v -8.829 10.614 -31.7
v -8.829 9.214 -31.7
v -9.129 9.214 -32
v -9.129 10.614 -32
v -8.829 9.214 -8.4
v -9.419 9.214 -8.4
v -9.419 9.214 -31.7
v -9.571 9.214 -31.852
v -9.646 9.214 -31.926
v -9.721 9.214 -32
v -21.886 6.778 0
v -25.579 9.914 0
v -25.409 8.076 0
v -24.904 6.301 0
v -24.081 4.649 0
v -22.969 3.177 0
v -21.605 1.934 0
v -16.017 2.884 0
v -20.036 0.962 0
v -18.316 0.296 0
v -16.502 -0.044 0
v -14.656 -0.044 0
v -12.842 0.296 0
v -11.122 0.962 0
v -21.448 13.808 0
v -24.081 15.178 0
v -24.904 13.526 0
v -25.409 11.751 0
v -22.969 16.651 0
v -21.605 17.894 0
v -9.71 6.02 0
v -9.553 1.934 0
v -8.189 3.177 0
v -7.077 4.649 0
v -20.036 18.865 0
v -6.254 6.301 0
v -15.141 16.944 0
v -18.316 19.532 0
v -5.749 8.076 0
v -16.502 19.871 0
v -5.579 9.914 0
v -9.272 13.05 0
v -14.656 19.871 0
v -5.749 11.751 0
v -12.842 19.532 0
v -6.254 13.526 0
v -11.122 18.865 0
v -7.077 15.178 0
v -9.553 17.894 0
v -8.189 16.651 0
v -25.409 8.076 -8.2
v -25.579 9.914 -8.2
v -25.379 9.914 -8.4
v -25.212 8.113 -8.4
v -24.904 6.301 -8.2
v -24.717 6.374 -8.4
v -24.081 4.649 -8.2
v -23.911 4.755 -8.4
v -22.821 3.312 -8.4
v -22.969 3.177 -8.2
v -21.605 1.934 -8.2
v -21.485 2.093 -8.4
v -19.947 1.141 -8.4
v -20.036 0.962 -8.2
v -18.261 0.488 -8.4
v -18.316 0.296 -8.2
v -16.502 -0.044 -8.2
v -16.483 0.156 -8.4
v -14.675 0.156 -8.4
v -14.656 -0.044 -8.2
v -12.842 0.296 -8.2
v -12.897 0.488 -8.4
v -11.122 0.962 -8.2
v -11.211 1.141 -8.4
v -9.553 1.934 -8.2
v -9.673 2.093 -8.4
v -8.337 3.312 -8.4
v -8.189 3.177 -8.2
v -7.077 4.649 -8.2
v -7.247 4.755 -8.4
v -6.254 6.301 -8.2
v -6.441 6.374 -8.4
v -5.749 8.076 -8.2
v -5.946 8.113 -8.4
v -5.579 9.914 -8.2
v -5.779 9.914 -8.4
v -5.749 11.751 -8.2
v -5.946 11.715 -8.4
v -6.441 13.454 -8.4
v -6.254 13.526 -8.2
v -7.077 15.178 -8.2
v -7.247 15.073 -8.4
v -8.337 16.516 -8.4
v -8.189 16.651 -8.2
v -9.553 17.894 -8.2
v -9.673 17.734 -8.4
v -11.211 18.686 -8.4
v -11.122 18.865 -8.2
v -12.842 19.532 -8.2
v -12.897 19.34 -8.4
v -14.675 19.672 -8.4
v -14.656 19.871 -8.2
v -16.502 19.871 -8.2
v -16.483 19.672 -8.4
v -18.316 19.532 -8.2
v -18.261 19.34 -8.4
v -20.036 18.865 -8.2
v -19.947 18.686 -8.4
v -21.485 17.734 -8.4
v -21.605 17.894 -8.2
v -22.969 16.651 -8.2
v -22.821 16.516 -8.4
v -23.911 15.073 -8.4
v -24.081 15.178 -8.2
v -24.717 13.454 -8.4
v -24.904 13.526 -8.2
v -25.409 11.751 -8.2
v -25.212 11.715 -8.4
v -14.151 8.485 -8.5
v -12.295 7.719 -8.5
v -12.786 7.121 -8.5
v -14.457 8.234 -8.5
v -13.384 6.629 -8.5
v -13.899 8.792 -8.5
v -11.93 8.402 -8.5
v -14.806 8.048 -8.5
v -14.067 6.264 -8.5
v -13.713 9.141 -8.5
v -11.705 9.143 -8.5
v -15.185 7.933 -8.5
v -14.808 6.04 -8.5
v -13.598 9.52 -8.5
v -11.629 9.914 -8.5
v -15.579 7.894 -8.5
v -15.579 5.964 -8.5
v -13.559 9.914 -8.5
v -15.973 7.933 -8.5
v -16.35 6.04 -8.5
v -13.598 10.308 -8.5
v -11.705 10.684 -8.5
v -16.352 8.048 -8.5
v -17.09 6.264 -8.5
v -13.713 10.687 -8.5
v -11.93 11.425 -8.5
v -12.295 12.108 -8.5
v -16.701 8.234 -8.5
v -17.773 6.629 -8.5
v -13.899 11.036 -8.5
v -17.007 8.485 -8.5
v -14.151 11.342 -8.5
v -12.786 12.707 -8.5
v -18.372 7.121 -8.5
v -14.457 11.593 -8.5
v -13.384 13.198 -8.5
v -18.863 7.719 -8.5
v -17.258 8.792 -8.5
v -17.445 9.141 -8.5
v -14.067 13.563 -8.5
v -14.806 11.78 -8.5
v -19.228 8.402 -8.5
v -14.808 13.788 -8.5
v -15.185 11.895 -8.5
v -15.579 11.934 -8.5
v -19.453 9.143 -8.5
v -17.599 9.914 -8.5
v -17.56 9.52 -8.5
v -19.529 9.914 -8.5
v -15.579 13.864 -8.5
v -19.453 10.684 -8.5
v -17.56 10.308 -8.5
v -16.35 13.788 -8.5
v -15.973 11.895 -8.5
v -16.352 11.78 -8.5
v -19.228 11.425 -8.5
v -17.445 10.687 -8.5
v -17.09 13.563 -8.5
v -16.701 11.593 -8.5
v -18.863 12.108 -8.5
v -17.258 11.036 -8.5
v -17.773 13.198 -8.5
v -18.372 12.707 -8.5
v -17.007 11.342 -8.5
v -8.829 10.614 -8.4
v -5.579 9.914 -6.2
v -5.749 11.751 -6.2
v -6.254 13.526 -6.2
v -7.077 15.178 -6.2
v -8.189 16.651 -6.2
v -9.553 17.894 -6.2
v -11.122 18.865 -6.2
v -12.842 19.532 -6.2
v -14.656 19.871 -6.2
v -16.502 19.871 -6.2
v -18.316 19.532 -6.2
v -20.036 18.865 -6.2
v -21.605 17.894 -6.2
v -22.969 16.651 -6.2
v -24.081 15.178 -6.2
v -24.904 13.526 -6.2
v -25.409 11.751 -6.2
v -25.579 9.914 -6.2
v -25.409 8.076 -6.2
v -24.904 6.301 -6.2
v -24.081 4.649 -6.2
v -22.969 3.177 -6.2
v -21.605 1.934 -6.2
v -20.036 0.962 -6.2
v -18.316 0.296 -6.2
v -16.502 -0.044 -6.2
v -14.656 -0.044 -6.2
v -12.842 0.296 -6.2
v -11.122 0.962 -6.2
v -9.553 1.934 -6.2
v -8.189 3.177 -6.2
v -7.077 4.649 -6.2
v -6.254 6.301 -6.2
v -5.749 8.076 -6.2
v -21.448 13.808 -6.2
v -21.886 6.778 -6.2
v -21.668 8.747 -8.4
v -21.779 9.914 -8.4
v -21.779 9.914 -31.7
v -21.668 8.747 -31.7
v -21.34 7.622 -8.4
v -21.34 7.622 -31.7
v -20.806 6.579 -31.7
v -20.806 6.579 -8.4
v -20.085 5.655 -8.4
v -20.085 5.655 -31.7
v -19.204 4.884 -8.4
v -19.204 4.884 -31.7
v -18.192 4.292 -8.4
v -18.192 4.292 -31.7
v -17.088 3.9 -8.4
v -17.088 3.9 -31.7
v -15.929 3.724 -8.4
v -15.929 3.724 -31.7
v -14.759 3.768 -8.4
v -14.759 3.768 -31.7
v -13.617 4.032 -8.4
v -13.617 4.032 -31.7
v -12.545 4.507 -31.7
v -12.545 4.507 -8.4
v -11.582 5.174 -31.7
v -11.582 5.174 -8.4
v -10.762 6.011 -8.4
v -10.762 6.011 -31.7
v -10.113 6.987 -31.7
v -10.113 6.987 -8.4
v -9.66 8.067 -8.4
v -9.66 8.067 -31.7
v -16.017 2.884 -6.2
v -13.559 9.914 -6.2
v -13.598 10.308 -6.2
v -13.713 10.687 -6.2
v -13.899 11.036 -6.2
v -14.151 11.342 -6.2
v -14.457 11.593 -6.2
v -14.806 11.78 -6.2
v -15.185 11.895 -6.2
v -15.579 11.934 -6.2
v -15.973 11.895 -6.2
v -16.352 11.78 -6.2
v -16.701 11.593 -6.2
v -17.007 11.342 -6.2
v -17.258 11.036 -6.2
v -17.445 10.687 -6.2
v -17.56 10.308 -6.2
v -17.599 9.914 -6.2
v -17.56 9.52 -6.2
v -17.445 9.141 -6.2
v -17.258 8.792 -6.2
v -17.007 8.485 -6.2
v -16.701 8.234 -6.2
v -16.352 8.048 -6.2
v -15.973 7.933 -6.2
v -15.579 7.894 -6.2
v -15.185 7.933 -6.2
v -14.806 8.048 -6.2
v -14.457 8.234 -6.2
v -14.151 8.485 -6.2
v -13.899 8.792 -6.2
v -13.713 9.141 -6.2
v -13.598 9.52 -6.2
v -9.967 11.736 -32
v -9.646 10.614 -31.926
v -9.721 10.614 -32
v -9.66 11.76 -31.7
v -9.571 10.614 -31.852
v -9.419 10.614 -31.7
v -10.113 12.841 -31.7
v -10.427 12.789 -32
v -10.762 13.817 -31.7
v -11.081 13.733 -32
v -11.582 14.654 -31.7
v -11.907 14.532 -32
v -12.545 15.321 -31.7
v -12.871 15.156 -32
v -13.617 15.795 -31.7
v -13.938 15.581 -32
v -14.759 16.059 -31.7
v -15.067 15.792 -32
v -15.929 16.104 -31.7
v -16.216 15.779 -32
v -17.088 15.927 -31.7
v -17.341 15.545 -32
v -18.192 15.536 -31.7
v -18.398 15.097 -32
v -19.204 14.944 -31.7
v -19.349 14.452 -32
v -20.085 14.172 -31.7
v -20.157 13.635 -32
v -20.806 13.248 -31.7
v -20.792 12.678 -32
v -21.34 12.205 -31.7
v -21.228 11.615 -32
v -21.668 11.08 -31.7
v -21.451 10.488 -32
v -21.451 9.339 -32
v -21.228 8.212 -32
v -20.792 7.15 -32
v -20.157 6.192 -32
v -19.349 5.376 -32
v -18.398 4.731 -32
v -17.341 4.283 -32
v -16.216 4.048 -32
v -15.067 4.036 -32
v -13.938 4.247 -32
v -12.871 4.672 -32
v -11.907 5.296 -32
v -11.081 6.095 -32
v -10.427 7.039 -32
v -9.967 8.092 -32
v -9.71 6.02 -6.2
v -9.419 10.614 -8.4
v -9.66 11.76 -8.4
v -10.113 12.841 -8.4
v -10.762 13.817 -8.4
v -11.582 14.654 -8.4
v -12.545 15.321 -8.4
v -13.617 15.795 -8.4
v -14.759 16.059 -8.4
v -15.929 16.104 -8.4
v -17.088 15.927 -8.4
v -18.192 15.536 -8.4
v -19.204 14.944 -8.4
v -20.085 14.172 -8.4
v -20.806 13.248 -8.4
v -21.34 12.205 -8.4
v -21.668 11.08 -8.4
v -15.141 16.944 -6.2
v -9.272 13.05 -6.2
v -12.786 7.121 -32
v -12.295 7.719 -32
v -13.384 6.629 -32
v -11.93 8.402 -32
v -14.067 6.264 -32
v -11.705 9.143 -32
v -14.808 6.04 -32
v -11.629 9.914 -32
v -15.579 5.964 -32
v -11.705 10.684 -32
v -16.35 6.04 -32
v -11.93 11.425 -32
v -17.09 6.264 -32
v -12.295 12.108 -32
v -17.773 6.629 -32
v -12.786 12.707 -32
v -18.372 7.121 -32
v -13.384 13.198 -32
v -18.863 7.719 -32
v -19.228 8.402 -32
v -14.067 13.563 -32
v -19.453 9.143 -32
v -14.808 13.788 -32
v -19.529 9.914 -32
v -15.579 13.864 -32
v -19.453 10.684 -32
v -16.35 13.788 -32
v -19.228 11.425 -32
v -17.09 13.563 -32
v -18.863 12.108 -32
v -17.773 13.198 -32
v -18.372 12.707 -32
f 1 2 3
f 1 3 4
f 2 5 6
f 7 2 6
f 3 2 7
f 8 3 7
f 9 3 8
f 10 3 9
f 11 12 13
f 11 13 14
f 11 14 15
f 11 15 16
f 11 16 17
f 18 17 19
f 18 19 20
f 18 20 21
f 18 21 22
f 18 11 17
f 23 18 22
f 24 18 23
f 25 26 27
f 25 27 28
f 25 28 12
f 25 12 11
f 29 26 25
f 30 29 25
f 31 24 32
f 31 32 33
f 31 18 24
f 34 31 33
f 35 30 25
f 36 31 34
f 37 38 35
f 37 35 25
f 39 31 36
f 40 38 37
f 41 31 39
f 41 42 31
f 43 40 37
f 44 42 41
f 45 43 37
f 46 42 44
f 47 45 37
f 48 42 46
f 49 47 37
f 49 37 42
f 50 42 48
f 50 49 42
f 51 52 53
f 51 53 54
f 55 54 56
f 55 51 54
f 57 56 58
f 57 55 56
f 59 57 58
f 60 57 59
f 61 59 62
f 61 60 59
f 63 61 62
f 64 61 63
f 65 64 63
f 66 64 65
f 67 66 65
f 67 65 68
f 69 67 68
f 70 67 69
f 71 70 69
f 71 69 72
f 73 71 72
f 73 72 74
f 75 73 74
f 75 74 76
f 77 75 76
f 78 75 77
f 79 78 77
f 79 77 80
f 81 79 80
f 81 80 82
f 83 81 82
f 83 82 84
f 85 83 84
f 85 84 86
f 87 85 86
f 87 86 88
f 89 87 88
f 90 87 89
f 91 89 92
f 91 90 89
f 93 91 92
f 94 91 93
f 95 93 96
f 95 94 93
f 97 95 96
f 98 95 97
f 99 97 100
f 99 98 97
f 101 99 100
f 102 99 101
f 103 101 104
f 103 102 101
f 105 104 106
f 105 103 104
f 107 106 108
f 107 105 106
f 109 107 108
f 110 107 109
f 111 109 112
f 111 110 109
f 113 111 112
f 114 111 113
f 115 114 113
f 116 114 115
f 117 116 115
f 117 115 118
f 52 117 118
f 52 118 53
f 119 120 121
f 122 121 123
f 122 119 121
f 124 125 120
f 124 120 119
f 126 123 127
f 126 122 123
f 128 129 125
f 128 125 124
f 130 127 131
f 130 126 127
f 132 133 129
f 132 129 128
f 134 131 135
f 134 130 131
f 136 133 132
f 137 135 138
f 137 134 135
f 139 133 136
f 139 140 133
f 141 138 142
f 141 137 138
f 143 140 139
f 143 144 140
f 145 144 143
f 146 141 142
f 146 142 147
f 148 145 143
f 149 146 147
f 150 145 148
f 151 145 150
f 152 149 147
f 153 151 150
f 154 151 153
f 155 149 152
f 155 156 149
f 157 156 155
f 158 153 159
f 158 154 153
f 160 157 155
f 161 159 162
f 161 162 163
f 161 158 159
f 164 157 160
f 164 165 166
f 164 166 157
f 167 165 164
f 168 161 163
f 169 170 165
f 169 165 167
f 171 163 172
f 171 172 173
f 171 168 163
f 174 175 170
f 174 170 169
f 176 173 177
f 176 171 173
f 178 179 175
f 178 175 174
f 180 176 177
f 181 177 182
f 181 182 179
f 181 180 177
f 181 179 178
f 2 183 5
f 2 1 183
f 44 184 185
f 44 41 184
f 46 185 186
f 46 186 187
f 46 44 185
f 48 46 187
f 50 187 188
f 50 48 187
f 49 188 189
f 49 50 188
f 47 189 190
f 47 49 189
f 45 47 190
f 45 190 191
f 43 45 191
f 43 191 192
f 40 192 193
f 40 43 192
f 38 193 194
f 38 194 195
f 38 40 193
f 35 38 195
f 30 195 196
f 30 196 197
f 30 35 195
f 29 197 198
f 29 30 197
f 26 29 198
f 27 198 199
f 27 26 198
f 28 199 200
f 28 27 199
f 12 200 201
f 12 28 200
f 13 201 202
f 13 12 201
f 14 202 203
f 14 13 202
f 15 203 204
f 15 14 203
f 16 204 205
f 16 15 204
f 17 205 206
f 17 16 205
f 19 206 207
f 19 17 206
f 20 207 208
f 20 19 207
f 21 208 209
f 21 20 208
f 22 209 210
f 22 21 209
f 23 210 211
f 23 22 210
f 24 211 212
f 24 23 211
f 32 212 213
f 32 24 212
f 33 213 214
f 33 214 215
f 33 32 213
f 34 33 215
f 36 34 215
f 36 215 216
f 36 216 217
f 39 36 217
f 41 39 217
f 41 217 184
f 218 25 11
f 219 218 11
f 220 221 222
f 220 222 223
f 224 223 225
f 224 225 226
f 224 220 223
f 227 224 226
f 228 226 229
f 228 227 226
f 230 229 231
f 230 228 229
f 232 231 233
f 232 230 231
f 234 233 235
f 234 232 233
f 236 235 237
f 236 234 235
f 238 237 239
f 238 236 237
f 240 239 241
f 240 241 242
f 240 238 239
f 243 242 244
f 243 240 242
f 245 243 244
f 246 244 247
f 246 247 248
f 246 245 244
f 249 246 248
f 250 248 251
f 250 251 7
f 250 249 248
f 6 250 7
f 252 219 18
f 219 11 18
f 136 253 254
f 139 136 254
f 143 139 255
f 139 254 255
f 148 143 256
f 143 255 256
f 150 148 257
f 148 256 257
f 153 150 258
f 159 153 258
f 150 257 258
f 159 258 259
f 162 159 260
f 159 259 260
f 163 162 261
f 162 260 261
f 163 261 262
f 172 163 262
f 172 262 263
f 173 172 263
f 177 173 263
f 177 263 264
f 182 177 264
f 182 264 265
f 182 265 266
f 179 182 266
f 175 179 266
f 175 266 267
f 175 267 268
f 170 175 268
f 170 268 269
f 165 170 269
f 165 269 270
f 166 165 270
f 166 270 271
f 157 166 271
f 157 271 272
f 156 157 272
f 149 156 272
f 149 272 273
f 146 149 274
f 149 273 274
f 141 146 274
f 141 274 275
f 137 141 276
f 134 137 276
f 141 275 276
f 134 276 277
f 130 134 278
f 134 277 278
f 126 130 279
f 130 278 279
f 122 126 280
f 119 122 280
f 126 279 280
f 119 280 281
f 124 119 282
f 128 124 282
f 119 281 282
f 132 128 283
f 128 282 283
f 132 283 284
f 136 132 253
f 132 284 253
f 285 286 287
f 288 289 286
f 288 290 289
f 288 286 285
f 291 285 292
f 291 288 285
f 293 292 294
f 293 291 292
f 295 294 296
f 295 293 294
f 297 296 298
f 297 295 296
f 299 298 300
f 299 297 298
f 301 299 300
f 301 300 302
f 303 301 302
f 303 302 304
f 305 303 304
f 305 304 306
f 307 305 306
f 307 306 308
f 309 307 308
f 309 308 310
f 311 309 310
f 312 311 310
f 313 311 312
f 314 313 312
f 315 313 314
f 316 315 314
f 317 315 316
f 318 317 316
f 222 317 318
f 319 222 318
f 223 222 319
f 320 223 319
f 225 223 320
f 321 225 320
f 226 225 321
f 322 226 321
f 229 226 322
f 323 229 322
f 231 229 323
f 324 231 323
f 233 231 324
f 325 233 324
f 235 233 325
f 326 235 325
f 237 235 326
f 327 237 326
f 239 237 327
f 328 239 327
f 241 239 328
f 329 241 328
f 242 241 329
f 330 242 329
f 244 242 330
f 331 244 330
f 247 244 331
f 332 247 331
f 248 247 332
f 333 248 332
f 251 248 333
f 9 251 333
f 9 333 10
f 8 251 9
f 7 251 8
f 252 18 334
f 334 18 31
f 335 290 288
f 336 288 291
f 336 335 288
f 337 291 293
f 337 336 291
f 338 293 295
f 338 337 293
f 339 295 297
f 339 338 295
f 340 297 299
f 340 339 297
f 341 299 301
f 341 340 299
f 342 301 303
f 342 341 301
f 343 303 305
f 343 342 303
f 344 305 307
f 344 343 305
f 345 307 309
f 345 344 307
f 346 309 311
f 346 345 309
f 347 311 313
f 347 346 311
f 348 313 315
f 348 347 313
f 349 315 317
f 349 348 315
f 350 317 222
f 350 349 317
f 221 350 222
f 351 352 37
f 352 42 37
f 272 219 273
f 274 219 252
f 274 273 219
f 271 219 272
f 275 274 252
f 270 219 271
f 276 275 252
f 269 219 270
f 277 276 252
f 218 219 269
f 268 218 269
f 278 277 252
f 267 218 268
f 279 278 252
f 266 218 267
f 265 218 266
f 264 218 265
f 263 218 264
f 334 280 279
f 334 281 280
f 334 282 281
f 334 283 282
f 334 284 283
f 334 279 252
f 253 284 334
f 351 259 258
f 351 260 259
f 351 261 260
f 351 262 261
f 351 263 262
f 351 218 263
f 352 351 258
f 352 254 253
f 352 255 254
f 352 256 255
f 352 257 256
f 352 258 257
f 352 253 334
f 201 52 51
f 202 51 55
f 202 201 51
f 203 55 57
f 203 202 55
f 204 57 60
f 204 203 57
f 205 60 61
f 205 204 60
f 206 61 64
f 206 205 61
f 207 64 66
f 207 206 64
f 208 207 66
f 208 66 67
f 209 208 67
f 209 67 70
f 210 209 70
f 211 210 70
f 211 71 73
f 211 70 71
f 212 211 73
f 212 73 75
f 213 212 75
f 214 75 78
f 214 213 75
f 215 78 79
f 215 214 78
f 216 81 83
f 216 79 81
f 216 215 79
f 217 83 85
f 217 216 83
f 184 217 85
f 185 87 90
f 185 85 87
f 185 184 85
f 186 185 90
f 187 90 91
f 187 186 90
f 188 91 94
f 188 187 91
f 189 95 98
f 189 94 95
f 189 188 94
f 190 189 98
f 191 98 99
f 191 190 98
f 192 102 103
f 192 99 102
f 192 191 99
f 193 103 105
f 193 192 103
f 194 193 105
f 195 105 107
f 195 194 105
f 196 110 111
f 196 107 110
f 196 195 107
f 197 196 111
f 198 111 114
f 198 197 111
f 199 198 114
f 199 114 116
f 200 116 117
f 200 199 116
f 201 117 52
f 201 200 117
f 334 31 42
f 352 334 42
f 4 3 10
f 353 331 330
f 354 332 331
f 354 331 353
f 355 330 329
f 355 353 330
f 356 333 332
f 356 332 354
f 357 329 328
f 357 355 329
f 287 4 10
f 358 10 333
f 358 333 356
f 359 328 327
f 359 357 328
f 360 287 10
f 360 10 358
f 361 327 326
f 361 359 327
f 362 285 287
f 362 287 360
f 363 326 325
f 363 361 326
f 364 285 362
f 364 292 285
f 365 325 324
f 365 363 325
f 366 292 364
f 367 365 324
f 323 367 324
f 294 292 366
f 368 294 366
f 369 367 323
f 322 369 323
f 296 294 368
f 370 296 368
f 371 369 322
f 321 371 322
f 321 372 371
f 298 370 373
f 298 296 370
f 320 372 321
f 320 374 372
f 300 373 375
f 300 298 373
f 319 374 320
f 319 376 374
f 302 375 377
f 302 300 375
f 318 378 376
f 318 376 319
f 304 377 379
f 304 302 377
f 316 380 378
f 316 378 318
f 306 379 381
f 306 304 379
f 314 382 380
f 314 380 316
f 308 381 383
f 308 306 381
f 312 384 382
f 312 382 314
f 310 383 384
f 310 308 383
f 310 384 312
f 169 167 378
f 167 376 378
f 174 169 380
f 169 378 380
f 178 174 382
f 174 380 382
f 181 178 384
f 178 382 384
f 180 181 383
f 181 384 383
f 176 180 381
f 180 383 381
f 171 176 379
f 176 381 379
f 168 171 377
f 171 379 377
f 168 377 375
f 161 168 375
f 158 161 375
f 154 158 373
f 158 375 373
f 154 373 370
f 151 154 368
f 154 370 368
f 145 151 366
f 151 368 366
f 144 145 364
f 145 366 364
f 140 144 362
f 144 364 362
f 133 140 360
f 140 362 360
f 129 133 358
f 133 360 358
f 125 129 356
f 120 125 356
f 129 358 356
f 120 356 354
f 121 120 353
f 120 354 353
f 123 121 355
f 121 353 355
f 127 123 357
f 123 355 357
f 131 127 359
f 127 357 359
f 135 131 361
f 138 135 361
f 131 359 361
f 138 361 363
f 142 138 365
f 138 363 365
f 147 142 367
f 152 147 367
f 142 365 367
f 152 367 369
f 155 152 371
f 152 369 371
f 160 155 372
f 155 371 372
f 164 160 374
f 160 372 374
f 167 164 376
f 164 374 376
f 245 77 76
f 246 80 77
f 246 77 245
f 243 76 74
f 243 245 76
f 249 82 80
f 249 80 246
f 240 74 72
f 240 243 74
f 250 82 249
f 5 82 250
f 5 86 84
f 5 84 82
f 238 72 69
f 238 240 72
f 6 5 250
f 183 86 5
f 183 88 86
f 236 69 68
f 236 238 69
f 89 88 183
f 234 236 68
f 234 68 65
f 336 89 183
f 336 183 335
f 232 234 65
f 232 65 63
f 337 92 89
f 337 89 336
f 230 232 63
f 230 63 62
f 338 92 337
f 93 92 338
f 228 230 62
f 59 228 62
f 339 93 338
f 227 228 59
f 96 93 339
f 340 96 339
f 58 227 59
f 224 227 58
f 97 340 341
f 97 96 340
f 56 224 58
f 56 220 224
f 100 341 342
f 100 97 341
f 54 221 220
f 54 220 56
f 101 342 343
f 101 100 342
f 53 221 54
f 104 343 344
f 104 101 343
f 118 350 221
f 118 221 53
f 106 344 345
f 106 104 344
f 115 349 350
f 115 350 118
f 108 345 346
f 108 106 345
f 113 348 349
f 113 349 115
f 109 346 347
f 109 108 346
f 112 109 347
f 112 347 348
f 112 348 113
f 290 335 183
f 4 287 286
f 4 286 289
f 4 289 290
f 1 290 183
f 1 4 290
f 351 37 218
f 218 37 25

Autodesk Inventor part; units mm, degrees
ref_plane "YZ Plane" through (0, 0, 0) normal (1, 0, 0) x (0, 1, 0)
ref_plane "XZ Plane" through (0, 0, 0) normal (0, 1, 0) x (-1, 0, 0)
ref_plane "Work Plane1" through (0, 0, 0) normal (0, 0, 1) x (1, 0, 0)
sketch "Sketch1" plane through (0, 0, 0) normal (0, 0, 1) x (1, 0, 0)
  line L0 (-9.8058, 6.0834) -> (-16.0096, 2.999) projected
  line L1 (-16.0096, 2.999) -> (-21.7826, 6.8295) projected
  line L2 (-21.7826, 6.8295) -> (-21.3519, 13.7443) projected
  line L3 (-21.3519, 13.7443) -> (-15.1481, 16.8286) projected
  line L4 (-15.1481, 16.8286) -> (-9.3751, 12.9982) projected
  line L5 (-9.3751, 12.9982) -> (-9.8058, 6.0834) projected
  line L6 (-15.1481, 16.8286) -> (-16.0096, 2.999)
  circle A0 centre (-15.5789, 9.9138) radius 10
  point P0 (0, 0)
  dimension "d0" = 12
  dimension "d1" = 20
extrude "Extrusion1" add sketch "Sketch1" against normal blind 6.2
sketch "Sketch2" plane through (-15.5789, 9.9138, -6.2) normal (0, 0, -1) x (-1, 0, 0)
  circle A0 centre (0, 0) radius 10 projected
  point P0 (-15.5789, -9.9138)
extrude "Extrusion2" add sketch "Sketch2" along normal blind 2.2
sketch "Sketch3" plane through (-15.5789, 9.9138, -8.4) normal (0, 0, -1) x (-1, 0, 0)
  circle A0 centre (0, 0) radius 10 projected
  circle A1 centre (0, 0) radius 3.3
  point P0 (-15.5789, -9.9138)
  dimension "d6" = 6.6
extrude "Extrusion3" cut sketch "Sketch3" against normal through all contours A1
sketch "Sketch4" plane through (-15.5789, 9.9138, -8.4) normal (0, 0, -1) x (-1, 0, 0)
  circle A0 centre (0, 0) radius 3.3 projected
  circle A1 centre (0, 0) radius 6.1
  point P0 (-15.5789, -9.9138)
  dimension "d9" = 12.2
extrude "Extrusion4" add sketch "Sketch4" along normal blind 23.5
chamfer "Chamfer3" distance 0.2 angle 45 1 edges at (-5.5789, 9.9138, -8.4)
sketch "Sketch6" plane through (-15.5789, 9.9138, -6.2) normal (0, 0, 1) x (1, 0, 0)
  circle A0 centre (0, 0) radius 3.3 projected
  point P0 (15.5789, -9.9138)
extrude "Extrusion6" add sketch "Sketch6" against normal blind 2.3
sketch "Sketch7" plane through (-15.5789, 9.9138, -8.5) normal (0, 0, -1) x (-1, 0, 0)
  circle A0 centre (0, 0) radius 3.3 projected
  circle A1 centre (0, 0) radius 1.92
  point P0 (-15.5789, -9.9138)
  dimension "d42" = 3.84
extrude "Extrusion7" cut sketch "Sketch7" against normal through all contours A1
sketch "Sketch9" plane through (-15.5789, 9.9138, -6.2) normal (0, 0, 1) x (1, 0, 0)
  circle A0 centre (0, 0) radius 1.92 projected
  circle A1 centre (0, 0) radius 2.02
  point P0 (15.5789, -9.9138)
  dimension "d52" = 0.1
extrude "Extrusion8" cut sketch "Sketch9" against normal blind 10 contours A0 | A1
sketch "Sketch10" plane through (-15.5789, 9.9138, 0) normal (0, 0, 1) x (1, 0, 0)
  circle A0 centre (0, 0) radius 10 projected
  line L0 (0.4308, 6.9148) -> (6.2038, 3.0844) projected
  line L1 (6.2038, 3.0844) -> (5.773, -3.8304) projected
  line L2 (5.773, -3.8304) -> (-0.4308, -6.9148) projected
  line L3 (-0.4308, -6.9148) -> (-6.2038, -3.0844) projected
  line L4 (-6.2038, -3.0844) -> (-5.773, 3.8304) projected
  line L5 (-5.773, 3.8304) -> (0.4308, 6.9148) projected
  line L6 (5.8692, -3.8943) -> (6.3072, 3.1358)
  line L7 (6.3072, 3.1358) -> (0.4379, 7.03)
  line L8 (0.4379, 7.03) -> (-5.8692, 3.8943)
  line L9 (-5.8692, 3.8943) -> (-6.3072, -3.1358)
  line L10 (-6.3072, -3.1358) -> (-0.4379, -7.03)
  line L11 (-0.4379, -7.03) -> (5.8692, -3.8943)
  point P0 (15.5789, -9.9138)
  dimension "d55" = 0.1
extrude "Extrusion9" cut sketch "Sketch10" against normal up to surface (6.2 mm away) contours L11 L10 L9 L8 L7 L6
thicken "Thicken3" operation add thickness 0.1 both sides no extend neighbours no toward (0, 0, -1) faces at (-20.6545, 9.164, -31.9) (-21.6591, 9.423, -24.0667)
sketch "Sketch11" plane through (-15.5789, 9.9138, -32) normal (0, 0, -1) x (-1, 0, 0)
  circle A0 centre (0, 0) radius 6.2 projected
  circle A1 centre (0, 0) radius 6.2 projected
  line L0 (-6.2, 0) -> (-6.2, 0.7)
  line L1 (-6.2, 0) -> (-5.5, 0) construction
  line L2 (-6.2, 0) -> (-6.2, -0.7)
  line L3 (-6.2, 0) -> (-5.5, 0) construction
  line L4 (-6.2, 0) -> (-6.7, 0)
  line L5 (-6.75, -0.7) -> (-5.75, -0.7)
  line L6 (-5.75, -0.7) -> (-5.75, 0.7)
  line L7 (-5.75, 0.7) -> (-6.75, 0.7)
  line L8 (-6.75, 0.7) -> (-6.75, -0.7)
  point P0 (-15.5789, -9.9138)
  dimension "d60" = 0.7
  dimension "d61" = 90
  dimension "d62" = 0.7
  dimension "d63" = 90
  dimension "d64" = 0.5
  dimension "d79" = 1
  dimension "d80" = 5.75
extrude "Extrusion10" add sketch "Sketch11" against normal up to surface (23.6 mm away) contours L7 L6 L5 A0 | A0 L0 L7 | L5 L2 A0 | L2 L5 L8 L7 L0 picked at (-5.9, 0)
chamfer "Chamfer9" distance 0.3 angle 45 2 edges at (-15.9294, 3.7237, -32) (-15.9294, 16.1039, -32)
chamfer "Chamfer10" distance 0.3 angle 45 1 edges at (-8.8289, 9.9138, -32)
sketch "Sketch14" plane through (-15.5789, 9.9138, -32) normal (0, 0, -1) x (-1, 0, 0)
  line L0 (-6.45, -0.7) -> (-6.45, 0.7) projected
  line L1 (-6.45, -0.7) -> (-5.8583, -0.7) projected
  arc A0 (-5.8583, -0.7) -> (-5.8583, 0.7) centre (0, 0) ccw projected
  line L2 (-5.8583, 0.7) -> (-6.45, 0.7) projected
  circle A1 centre (0, 0) radius 3.3 projected
  circle A2 centre (0, 0) radius 3.95
  point P0 (-15.5789, -9.9138)
  dimension "d75" = 6.6
  dimension "d76" = 7.9
extrude "Extrusion12" cut sketch "Sketch14" against normal up to surface (23.5 mm away) contours A1 | A2
properties part number "omni_ext_3DPrint"
